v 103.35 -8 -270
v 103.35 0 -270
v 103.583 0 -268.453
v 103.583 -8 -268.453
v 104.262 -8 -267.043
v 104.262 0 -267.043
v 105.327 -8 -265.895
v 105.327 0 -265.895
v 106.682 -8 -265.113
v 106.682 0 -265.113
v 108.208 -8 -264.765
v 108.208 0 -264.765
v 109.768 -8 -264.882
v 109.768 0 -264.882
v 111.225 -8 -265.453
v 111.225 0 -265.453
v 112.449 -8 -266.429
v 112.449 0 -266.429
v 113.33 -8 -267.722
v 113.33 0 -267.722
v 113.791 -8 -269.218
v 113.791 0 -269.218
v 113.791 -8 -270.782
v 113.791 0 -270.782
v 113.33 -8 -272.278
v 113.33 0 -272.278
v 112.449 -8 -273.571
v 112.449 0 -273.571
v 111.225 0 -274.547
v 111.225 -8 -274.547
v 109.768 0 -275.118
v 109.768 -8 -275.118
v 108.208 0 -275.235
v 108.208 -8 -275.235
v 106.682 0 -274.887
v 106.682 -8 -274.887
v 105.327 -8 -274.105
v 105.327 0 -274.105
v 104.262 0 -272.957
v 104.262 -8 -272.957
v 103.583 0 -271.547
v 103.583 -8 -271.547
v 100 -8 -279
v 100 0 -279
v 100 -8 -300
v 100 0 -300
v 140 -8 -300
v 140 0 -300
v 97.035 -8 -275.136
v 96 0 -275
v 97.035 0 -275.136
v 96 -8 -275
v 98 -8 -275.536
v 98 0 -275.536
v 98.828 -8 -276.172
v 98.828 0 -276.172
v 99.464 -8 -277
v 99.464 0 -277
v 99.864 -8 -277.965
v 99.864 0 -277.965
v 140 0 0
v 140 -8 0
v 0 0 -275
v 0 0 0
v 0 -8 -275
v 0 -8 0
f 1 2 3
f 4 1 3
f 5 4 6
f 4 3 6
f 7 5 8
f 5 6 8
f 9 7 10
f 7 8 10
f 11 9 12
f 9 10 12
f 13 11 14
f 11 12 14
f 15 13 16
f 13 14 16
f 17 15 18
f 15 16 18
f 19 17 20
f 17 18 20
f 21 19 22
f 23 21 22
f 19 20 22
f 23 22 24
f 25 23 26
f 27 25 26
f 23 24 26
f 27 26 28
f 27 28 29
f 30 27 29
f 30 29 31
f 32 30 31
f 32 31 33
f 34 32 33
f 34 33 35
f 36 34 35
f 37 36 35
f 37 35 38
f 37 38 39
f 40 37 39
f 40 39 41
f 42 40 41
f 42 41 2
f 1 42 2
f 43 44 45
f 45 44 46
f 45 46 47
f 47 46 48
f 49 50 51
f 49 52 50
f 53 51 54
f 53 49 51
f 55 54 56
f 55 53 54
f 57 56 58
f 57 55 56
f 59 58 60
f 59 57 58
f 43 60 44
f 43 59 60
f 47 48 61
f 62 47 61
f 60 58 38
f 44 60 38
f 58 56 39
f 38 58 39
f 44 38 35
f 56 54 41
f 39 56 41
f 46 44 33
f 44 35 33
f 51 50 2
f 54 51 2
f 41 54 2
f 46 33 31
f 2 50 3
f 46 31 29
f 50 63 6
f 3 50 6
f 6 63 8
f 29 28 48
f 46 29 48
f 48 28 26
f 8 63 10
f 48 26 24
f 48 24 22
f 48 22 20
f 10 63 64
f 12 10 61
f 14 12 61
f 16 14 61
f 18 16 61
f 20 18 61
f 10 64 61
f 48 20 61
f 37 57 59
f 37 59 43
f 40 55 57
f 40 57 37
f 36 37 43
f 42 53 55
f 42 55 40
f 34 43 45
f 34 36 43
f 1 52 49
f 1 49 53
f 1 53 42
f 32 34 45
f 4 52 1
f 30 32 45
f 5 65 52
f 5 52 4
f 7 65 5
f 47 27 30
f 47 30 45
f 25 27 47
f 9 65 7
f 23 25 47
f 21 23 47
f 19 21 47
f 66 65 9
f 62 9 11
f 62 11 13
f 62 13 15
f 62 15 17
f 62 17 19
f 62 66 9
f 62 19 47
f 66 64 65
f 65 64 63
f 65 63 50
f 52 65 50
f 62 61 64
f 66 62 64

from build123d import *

# Parameters (mm, degrees)
F1_DEPTH = 8
F2_R     = 4
F4_D     = 10.5


with BuildPart() as f1:
    # F0 (on Front) → F1 (new body)
    with BuildSketch(Plane.XZ):
        Polygon((140, 0), (0, 0), (0, -275), (100, -275), (100, -300), (140, -300), align=None)
    extrude(amount=F1_DEPTH)

    # F2
    f2_edges = [f1.edges().sort_by_distance(p)[0] for p in [
        (100, -4, -275),
    ]]
    fillet(f2_edges, radius=F2_R)

    # F4 (through all)
    with Locations(Plane.XZ.offset(8)):
        with Locations((108.6, -270)):
            Hole(F4_D / 2)


solid = f1.part
